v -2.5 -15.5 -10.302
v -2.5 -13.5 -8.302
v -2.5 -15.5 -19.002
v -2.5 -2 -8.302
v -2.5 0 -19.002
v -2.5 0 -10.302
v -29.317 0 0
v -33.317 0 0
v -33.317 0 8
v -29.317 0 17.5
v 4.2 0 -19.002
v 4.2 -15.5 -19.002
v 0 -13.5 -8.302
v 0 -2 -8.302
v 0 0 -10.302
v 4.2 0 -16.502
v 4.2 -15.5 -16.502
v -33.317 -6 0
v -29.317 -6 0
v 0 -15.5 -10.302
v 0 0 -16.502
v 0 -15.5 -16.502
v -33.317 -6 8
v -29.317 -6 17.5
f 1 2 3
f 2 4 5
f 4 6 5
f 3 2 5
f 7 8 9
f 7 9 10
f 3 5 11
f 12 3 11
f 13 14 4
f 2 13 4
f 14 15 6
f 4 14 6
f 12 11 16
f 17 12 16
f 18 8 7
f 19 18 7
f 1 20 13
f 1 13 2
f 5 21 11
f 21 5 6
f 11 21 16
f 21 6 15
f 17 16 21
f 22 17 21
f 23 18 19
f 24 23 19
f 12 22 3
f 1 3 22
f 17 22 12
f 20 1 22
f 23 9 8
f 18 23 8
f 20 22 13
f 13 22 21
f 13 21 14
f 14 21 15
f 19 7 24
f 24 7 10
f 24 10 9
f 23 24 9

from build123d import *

# Parameters (mm, degrees)
F1_DEPTH = 15.5
F2_SIZE  = 2
F3_SIZE  = 2
F5_DEPTH = 6


with BuildPart() as f1:
    # F0 (on Front) → F1 (new body)
    with BuildSketch(Plane.XZ):
        Polygon((0, -8.302393), (-2.5, -8.302393), (-2.5, -19.002393), (4.2, -19.002393), (4.2, -16.502393), (0, -16.502393), align=None)
    extrude(amount=F1_DEPTH)

    # F2
    f2_edges = [f1.edges().sort_by_distance(p)[0] for p in [
        (-1.25, -15.5, -8.302393),
    ]]
    chamfer(f2_edges, length=F2_SIZE)

    # F3
    f3_edges = [f1.edges().sort_by_distance(p)[0] for p in [
        (-1.25, 0, -8.302393),
    ]]
    chamfer(f3_edges, length=F3_SIZE)


with BuildPart() as f5:
    # F4 (on Front) → F5 (new body)
    with BuildSketch(Plane.XZ):
        Polygon((-33.317309, 0), (-29.317309, 0), (-29.317309, 17.5), (-33.317309, 8), align=None)
    extrude(amount=F5_DEPTH)


solid = Compound([f1.part, f5.part])
